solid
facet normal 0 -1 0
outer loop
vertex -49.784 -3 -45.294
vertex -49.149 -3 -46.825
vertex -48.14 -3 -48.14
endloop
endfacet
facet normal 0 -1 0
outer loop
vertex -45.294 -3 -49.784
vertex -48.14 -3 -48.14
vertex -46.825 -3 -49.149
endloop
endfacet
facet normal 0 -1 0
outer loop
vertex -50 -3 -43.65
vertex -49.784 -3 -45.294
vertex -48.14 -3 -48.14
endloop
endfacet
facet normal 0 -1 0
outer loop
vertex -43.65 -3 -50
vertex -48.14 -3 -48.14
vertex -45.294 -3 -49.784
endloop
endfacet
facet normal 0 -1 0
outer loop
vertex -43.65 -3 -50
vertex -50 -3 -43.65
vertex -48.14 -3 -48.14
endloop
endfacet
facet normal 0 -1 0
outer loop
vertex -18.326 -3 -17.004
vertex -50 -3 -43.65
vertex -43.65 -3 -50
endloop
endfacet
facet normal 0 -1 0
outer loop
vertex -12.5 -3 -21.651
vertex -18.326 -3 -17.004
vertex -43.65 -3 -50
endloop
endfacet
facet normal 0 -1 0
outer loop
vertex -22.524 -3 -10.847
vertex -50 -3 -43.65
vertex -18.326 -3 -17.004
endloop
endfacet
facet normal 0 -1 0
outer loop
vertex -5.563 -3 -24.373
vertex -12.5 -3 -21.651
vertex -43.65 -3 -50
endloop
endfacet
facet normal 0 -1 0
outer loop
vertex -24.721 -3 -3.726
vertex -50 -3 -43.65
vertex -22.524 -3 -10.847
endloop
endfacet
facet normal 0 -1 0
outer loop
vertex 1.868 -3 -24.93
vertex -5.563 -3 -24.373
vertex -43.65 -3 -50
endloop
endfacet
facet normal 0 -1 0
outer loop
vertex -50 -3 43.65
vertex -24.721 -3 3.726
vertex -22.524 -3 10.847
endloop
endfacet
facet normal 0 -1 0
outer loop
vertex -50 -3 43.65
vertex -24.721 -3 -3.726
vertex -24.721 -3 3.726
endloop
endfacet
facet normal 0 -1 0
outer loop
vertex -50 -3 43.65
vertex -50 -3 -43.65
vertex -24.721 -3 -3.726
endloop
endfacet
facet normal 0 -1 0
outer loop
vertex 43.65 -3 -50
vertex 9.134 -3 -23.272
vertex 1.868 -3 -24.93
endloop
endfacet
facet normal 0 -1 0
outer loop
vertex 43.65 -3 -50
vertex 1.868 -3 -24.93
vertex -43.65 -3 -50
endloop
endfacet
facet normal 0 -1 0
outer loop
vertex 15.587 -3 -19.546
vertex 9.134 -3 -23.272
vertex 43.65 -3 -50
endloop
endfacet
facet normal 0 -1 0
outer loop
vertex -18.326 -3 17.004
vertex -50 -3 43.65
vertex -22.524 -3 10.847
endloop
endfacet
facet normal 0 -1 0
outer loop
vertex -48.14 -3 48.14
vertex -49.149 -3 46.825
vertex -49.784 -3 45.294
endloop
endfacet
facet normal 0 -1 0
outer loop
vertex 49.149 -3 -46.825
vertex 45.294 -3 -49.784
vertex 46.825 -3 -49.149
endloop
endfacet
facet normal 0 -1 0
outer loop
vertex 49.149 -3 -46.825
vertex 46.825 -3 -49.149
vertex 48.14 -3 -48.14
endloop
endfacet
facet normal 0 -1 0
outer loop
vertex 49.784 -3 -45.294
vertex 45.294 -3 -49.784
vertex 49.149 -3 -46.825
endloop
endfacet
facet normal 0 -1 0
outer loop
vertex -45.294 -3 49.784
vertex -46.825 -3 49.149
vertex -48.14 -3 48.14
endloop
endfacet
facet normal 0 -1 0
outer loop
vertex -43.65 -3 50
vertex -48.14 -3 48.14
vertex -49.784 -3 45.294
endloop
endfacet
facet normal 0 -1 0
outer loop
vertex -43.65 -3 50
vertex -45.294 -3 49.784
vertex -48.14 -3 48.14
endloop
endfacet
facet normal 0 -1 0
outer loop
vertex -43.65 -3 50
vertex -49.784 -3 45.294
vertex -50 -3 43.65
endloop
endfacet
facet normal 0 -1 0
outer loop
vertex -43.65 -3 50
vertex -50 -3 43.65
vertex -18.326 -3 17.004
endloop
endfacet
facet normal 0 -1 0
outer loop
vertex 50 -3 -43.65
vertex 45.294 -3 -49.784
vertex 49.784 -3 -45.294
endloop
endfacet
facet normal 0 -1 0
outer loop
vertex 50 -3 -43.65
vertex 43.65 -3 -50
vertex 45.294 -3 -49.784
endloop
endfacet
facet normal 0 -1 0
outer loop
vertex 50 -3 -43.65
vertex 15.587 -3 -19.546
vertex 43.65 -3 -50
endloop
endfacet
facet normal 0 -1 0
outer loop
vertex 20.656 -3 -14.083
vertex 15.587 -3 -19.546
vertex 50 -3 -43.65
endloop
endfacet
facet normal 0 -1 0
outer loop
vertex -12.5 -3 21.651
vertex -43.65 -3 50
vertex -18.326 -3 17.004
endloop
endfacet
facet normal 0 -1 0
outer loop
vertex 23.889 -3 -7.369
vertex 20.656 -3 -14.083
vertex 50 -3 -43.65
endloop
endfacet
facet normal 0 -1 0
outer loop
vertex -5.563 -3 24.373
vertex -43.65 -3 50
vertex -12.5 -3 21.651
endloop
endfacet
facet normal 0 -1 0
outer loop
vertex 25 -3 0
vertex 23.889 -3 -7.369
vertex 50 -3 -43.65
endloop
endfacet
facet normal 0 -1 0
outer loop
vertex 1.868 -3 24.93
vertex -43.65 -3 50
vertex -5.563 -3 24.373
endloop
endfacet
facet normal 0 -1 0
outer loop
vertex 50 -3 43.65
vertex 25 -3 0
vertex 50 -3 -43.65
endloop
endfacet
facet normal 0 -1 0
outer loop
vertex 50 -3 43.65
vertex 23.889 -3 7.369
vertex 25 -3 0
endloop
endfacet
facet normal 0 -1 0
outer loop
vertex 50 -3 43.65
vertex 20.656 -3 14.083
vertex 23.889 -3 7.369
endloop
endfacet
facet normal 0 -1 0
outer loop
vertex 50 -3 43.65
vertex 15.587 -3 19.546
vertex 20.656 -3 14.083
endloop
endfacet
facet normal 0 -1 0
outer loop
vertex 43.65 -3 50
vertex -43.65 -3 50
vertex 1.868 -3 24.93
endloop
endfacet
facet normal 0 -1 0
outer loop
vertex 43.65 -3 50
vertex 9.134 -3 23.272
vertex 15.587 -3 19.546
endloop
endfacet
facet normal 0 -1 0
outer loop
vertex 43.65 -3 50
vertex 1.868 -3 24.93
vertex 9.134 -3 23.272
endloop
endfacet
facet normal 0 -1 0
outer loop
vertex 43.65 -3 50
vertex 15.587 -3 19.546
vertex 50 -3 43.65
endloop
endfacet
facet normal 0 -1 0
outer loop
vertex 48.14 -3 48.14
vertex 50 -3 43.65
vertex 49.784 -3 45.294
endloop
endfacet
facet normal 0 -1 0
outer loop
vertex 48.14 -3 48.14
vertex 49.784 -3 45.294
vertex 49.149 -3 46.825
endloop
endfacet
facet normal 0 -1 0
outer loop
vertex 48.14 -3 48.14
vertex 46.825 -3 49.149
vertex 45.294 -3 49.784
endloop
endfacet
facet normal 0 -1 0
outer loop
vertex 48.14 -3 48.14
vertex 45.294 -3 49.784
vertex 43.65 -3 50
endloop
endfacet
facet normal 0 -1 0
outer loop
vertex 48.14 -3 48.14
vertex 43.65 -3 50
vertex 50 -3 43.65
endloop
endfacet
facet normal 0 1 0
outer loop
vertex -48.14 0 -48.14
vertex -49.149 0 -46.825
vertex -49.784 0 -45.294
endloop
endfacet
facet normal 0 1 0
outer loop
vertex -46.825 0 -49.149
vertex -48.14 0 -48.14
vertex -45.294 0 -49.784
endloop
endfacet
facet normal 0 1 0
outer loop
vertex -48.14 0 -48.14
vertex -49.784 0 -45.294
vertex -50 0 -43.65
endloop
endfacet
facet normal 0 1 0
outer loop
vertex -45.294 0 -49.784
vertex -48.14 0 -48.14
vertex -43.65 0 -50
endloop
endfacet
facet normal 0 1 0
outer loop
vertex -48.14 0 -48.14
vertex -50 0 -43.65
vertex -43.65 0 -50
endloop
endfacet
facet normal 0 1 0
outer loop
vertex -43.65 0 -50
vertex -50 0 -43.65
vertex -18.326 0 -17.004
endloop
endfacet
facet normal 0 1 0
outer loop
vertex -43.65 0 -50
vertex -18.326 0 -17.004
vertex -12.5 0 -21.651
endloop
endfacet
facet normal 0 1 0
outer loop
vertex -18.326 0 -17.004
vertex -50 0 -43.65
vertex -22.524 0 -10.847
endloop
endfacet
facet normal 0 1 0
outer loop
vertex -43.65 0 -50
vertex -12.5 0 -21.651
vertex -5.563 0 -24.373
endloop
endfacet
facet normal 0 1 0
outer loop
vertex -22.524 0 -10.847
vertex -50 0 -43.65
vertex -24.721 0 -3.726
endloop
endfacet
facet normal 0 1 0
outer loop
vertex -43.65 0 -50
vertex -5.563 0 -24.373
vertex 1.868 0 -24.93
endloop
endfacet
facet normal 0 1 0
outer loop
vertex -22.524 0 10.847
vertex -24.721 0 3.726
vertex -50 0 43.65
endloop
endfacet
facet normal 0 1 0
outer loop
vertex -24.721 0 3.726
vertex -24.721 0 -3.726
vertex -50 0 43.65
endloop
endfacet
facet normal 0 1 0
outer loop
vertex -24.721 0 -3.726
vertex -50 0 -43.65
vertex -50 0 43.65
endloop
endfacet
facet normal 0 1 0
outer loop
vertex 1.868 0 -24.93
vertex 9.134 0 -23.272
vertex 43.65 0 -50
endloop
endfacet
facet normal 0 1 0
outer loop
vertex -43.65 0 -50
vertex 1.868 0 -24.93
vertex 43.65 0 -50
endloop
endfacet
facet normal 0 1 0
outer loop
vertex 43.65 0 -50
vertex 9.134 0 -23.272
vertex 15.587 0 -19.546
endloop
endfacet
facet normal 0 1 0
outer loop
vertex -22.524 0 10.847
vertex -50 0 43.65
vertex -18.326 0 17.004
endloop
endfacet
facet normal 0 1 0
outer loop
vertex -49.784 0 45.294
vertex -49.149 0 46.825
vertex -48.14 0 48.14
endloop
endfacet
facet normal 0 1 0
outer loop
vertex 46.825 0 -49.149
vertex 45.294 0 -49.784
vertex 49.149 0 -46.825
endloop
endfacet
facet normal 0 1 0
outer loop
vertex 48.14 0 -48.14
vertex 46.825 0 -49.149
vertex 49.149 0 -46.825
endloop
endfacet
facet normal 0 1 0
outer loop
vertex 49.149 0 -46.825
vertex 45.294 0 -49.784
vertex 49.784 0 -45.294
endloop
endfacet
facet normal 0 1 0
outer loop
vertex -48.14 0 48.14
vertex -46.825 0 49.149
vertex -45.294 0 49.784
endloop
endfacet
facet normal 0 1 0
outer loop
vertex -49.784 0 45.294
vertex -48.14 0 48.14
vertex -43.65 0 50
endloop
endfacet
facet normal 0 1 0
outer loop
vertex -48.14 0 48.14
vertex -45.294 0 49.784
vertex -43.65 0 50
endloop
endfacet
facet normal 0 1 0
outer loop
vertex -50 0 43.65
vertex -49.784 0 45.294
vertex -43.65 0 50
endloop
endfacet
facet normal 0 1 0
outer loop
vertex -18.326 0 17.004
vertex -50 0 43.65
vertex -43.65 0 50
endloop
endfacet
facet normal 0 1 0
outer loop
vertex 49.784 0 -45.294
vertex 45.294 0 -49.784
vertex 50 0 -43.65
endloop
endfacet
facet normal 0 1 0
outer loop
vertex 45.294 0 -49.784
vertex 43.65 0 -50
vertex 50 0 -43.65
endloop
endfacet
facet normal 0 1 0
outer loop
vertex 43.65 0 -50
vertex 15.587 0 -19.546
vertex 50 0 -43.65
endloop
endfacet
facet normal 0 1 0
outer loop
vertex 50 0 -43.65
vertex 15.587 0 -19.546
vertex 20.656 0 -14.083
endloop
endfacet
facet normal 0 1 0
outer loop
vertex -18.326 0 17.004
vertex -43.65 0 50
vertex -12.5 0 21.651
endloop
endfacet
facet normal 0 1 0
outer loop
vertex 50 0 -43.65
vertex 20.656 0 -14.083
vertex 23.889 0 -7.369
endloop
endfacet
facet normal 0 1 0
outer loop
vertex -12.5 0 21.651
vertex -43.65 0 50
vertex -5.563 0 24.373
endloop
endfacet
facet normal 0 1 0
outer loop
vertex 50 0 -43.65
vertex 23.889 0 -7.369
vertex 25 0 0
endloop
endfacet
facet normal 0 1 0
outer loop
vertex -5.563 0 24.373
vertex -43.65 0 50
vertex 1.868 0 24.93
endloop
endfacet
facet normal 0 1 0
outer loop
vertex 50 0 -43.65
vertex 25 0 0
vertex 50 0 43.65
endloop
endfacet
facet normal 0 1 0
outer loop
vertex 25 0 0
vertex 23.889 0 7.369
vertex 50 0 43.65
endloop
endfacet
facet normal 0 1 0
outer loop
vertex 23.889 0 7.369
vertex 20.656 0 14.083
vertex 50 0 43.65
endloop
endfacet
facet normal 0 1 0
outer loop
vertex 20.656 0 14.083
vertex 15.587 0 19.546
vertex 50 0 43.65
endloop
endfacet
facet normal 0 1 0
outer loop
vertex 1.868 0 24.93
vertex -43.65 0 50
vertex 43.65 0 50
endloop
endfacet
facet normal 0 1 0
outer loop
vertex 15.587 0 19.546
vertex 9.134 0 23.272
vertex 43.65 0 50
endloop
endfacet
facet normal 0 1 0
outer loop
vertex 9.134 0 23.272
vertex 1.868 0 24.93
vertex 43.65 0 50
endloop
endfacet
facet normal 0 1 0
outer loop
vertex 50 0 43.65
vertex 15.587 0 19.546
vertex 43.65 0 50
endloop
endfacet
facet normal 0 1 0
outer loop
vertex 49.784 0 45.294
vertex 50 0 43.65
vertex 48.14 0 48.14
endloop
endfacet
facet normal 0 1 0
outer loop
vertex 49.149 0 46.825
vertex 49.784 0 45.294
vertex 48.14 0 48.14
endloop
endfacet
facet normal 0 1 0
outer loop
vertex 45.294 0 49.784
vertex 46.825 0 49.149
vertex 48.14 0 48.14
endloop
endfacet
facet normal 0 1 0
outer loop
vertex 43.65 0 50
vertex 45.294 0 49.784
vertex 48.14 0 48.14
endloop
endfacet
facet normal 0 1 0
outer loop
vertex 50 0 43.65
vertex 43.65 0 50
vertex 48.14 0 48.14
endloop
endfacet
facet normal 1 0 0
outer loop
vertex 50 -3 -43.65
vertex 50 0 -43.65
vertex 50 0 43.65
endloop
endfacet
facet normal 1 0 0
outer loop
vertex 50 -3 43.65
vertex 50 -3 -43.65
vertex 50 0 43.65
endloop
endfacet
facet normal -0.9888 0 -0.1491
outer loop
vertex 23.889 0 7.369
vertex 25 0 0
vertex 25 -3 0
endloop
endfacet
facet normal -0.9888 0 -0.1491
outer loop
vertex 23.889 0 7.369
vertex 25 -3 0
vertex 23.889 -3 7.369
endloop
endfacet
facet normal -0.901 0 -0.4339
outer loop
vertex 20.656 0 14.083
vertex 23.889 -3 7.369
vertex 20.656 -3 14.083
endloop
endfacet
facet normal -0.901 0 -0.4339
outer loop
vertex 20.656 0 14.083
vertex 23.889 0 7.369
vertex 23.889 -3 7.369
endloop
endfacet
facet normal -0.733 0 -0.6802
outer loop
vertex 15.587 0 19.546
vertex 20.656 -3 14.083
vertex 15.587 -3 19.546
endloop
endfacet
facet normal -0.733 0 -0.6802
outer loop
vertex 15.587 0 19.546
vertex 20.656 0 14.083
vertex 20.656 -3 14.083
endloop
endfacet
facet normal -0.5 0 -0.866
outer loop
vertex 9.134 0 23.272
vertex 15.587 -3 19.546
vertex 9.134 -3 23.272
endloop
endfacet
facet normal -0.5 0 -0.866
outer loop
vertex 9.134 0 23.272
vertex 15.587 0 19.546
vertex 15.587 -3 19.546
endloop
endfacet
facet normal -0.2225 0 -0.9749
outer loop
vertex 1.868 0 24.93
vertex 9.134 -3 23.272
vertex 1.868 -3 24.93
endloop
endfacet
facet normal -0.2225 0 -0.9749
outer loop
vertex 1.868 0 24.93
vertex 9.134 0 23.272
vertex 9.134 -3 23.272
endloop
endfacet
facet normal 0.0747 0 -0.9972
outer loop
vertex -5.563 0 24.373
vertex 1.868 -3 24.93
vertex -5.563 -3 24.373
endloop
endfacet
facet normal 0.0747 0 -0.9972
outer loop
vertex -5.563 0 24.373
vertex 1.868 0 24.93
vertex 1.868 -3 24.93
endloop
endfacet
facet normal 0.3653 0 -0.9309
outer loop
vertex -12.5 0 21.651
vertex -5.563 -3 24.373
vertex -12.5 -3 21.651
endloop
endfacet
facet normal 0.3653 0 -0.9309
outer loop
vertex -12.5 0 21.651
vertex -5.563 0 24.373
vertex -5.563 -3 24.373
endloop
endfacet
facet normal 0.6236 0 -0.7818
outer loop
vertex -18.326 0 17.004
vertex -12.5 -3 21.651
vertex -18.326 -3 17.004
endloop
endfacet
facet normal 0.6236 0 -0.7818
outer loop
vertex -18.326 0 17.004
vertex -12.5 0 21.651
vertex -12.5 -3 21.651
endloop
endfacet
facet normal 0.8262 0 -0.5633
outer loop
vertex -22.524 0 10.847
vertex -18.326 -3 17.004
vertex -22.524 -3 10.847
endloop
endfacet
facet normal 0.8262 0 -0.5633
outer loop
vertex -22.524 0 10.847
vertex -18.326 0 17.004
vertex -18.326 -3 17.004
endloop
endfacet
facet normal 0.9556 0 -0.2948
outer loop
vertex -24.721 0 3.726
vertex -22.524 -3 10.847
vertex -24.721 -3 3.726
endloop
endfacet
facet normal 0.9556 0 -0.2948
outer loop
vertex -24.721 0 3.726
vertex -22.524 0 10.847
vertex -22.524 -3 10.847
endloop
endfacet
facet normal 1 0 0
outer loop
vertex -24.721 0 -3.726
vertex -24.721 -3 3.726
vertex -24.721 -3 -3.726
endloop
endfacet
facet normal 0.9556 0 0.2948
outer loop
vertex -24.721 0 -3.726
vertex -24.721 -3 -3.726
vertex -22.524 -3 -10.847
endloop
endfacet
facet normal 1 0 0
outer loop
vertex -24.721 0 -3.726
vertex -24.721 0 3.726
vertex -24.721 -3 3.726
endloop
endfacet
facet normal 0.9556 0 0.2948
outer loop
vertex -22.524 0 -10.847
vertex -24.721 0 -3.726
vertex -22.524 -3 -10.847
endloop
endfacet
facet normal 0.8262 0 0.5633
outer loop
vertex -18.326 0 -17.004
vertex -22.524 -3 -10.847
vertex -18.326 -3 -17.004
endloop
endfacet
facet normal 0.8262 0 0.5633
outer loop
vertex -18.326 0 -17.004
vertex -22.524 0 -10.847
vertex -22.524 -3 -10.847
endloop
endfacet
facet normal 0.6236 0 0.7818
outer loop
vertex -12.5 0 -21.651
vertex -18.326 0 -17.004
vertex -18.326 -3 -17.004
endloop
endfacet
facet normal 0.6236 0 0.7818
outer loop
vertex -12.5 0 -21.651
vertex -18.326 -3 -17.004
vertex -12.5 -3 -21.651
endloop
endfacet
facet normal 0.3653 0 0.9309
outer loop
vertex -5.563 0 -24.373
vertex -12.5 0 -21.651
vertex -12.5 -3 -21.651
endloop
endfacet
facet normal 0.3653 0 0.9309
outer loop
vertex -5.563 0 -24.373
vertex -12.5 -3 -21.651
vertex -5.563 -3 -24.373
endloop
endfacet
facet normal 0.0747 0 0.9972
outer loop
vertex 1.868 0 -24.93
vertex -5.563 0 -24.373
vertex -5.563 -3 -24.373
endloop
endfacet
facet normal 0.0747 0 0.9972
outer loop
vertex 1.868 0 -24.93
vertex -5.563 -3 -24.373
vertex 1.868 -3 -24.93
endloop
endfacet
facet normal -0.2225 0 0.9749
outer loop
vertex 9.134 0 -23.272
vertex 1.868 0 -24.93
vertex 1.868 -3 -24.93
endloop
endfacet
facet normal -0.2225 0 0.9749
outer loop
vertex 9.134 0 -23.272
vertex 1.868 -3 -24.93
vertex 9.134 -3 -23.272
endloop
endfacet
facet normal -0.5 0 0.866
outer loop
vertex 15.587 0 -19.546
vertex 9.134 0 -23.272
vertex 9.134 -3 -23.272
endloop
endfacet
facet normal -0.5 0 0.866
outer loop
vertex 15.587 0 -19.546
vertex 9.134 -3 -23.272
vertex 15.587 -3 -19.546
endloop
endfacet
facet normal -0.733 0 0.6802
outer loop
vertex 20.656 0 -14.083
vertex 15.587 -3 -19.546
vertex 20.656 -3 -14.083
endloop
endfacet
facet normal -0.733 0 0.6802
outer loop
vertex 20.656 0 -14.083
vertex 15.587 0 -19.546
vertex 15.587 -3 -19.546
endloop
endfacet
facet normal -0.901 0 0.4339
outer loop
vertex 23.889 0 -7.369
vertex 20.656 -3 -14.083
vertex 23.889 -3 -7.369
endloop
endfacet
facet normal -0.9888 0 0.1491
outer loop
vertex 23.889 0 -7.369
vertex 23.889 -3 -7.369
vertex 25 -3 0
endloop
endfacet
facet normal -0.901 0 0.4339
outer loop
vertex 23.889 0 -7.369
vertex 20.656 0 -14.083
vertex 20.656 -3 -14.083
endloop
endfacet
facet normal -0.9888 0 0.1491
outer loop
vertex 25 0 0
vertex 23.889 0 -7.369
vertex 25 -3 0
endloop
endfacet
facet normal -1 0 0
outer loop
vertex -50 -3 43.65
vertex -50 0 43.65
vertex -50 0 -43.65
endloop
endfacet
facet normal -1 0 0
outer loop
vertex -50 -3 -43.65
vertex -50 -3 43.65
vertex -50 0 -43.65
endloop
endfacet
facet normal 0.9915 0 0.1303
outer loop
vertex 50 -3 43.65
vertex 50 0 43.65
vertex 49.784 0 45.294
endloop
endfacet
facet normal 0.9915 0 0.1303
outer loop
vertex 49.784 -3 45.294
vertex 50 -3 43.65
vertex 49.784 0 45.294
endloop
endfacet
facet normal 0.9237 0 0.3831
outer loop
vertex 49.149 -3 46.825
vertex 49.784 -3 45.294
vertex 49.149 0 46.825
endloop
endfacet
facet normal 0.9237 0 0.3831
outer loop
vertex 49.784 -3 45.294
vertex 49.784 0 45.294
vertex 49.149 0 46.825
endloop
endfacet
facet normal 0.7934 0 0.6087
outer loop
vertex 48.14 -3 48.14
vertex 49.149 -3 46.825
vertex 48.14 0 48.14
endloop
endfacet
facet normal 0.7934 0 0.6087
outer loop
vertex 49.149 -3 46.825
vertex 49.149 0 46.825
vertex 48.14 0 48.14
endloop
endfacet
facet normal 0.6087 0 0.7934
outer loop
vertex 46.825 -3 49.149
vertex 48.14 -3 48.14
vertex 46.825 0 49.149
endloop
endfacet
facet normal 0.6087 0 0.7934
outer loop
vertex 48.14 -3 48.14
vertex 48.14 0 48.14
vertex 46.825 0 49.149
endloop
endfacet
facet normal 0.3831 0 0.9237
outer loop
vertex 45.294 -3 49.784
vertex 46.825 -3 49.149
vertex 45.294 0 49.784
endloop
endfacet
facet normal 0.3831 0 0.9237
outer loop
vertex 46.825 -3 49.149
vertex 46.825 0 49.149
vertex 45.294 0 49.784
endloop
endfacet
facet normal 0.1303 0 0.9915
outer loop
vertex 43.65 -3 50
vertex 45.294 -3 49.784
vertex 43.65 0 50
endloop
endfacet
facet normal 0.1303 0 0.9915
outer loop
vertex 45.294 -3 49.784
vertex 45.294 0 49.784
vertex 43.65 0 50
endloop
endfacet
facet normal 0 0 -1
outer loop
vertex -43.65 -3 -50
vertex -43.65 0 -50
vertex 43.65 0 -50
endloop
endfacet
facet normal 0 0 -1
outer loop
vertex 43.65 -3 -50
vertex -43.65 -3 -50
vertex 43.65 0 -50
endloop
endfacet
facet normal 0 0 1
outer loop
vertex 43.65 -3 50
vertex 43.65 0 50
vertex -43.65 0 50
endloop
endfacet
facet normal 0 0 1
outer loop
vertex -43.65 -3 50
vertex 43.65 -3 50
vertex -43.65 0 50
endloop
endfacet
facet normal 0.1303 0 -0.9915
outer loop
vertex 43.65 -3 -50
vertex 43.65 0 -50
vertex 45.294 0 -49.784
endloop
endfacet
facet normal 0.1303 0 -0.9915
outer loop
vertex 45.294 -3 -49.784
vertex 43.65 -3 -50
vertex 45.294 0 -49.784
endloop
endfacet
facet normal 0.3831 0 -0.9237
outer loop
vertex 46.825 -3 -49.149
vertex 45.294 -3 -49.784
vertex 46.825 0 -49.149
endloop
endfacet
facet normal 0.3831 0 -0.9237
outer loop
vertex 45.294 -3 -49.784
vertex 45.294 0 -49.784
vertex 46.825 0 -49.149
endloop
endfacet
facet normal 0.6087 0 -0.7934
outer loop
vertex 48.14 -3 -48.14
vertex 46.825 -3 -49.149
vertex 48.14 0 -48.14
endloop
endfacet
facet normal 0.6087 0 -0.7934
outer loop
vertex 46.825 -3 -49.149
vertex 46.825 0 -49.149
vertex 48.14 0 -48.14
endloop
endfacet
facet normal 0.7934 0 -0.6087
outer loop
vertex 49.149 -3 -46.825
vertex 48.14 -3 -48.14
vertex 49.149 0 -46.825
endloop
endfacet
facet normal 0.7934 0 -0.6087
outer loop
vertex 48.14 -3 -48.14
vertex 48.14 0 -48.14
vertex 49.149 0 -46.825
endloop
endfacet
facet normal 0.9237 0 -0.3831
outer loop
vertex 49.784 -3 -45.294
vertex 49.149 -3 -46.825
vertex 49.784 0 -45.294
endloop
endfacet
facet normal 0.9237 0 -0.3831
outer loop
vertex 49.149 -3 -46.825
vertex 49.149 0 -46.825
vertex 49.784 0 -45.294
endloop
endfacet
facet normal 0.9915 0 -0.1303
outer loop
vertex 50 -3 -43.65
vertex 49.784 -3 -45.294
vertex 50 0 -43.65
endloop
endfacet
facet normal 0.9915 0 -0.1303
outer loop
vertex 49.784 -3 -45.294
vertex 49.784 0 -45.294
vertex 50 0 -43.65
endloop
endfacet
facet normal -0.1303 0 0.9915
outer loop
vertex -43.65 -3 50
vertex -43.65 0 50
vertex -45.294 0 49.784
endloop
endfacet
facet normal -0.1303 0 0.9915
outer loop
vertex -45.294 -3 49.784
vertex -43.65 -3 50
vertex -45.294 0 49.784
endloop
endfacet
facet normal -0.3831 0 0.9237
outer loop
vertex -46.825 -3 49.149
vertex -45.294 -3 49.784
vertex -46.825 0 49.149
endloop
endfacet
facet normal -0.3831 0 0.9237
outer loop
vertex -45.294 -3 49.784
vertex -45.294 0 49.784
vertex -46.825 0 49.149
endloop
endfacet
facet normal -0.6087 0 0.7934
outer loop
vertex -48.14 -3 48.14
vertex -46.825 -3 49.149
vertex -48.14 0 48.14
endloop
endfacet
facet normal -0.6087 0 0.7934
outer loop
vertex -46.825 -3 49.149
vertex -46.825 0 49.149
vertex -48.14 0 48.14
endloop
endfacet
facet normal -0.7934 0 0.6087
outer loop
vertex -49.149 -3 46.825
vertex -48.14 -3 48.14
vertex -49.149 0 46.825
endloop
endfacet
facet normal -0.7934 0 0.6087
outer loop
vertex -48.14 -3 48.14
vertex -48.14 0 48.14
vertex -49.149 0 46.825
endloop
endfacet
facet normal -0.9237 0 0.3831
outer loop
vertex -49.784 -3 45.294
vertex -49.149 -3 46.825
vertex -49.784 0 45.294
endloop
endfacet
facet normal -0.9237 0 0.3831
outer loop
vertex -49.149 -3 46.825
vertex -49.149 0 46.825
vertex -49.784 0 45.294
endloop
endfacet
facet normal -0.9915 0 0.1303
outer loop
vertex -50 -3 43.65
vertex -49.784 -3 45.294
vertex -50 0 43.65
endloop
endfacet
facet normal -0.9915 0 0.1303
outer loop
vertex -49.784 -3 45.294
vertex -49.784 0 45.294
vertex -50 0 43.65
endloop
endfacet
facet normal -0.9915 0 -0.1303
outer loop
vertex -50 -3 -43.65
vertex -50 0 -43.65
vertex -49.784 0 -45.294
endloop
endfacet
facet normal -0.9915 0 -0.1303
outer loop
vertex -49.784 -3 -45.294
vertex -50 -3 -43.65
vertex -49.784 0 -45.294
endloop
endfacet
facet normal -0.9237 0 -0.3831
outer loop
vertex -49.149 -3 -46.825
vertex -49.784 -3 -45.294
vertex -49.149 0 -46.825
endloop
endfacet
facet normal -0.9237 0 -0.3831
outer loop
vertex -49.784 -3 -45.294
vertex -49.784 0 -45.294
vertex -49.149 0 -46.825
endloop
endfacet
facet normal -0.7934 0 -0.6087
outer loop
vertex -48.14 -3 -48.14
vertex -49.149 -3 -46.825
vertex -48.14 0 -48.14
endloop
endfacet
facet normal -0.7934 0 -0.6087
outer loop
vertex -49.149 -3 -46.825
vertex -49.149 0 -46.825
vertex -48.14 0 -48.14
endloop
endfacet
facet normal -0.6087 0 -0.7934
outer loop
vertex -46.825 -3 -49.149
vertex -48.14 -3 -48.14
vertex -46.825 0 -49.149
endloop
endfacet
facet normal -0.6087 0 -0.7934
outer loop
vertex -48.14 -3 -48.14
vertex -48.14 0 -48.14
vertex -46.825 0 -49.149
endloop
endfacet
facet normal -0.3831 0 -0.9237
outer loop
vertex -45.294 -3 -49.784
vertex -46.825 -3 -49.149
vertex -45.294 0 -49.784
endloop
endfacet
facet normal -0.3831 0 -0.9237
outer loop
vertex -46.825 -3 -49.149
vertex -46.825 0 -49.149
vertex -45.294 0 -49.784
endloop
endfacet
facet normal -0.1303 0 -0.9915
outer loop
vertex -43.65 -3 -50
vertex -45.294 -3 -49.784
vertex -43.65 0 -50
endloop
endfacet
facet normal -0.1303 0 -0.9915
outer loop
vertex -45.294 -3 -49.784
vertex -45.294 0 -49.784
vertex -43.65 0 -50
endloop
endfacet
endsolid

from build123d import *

# Parameters (mm, degrees)
F0_R     = 25
F1_DEPTH = 3


# Not quite as in the source:
# - a feature of the source that left no trace in its solid (it failed there, or was rolled back) is left out


with BuildPart() as f1:
    # F0 (on Front) → F1 (new body)
    with BuildSketch(Plane.XZ):
        with BuildLine():
            Line((43.65, 50), (-43.65, 50))
            ThreePointArc((-43.65, 50), (-48.1401280605, 48.1401280605), (-50, 43.65))
            Line((-50, 43.65), (-50, -43.65))
            ThreePointArc((-50, -43.65), (-48.1401280605, -48.1401280605), (-43.65, -50))
            Line((-43.65, -50), (43.65, -50))
            ThreePointArc((43.65, -50), (48.1401280605, -48.1401280605), (50, -43.65))
            Line((50, -43.65), (50, 43.65))
            ThreePointArc((50, 43.65), (48.1401280605, 48.1401280605), (43.65, 50))
        make_face()
        Circle(F0_R, mode=Mode.SUBTRACT)
    extrude(amount=F1_DEPTH)


solid = f1.part
